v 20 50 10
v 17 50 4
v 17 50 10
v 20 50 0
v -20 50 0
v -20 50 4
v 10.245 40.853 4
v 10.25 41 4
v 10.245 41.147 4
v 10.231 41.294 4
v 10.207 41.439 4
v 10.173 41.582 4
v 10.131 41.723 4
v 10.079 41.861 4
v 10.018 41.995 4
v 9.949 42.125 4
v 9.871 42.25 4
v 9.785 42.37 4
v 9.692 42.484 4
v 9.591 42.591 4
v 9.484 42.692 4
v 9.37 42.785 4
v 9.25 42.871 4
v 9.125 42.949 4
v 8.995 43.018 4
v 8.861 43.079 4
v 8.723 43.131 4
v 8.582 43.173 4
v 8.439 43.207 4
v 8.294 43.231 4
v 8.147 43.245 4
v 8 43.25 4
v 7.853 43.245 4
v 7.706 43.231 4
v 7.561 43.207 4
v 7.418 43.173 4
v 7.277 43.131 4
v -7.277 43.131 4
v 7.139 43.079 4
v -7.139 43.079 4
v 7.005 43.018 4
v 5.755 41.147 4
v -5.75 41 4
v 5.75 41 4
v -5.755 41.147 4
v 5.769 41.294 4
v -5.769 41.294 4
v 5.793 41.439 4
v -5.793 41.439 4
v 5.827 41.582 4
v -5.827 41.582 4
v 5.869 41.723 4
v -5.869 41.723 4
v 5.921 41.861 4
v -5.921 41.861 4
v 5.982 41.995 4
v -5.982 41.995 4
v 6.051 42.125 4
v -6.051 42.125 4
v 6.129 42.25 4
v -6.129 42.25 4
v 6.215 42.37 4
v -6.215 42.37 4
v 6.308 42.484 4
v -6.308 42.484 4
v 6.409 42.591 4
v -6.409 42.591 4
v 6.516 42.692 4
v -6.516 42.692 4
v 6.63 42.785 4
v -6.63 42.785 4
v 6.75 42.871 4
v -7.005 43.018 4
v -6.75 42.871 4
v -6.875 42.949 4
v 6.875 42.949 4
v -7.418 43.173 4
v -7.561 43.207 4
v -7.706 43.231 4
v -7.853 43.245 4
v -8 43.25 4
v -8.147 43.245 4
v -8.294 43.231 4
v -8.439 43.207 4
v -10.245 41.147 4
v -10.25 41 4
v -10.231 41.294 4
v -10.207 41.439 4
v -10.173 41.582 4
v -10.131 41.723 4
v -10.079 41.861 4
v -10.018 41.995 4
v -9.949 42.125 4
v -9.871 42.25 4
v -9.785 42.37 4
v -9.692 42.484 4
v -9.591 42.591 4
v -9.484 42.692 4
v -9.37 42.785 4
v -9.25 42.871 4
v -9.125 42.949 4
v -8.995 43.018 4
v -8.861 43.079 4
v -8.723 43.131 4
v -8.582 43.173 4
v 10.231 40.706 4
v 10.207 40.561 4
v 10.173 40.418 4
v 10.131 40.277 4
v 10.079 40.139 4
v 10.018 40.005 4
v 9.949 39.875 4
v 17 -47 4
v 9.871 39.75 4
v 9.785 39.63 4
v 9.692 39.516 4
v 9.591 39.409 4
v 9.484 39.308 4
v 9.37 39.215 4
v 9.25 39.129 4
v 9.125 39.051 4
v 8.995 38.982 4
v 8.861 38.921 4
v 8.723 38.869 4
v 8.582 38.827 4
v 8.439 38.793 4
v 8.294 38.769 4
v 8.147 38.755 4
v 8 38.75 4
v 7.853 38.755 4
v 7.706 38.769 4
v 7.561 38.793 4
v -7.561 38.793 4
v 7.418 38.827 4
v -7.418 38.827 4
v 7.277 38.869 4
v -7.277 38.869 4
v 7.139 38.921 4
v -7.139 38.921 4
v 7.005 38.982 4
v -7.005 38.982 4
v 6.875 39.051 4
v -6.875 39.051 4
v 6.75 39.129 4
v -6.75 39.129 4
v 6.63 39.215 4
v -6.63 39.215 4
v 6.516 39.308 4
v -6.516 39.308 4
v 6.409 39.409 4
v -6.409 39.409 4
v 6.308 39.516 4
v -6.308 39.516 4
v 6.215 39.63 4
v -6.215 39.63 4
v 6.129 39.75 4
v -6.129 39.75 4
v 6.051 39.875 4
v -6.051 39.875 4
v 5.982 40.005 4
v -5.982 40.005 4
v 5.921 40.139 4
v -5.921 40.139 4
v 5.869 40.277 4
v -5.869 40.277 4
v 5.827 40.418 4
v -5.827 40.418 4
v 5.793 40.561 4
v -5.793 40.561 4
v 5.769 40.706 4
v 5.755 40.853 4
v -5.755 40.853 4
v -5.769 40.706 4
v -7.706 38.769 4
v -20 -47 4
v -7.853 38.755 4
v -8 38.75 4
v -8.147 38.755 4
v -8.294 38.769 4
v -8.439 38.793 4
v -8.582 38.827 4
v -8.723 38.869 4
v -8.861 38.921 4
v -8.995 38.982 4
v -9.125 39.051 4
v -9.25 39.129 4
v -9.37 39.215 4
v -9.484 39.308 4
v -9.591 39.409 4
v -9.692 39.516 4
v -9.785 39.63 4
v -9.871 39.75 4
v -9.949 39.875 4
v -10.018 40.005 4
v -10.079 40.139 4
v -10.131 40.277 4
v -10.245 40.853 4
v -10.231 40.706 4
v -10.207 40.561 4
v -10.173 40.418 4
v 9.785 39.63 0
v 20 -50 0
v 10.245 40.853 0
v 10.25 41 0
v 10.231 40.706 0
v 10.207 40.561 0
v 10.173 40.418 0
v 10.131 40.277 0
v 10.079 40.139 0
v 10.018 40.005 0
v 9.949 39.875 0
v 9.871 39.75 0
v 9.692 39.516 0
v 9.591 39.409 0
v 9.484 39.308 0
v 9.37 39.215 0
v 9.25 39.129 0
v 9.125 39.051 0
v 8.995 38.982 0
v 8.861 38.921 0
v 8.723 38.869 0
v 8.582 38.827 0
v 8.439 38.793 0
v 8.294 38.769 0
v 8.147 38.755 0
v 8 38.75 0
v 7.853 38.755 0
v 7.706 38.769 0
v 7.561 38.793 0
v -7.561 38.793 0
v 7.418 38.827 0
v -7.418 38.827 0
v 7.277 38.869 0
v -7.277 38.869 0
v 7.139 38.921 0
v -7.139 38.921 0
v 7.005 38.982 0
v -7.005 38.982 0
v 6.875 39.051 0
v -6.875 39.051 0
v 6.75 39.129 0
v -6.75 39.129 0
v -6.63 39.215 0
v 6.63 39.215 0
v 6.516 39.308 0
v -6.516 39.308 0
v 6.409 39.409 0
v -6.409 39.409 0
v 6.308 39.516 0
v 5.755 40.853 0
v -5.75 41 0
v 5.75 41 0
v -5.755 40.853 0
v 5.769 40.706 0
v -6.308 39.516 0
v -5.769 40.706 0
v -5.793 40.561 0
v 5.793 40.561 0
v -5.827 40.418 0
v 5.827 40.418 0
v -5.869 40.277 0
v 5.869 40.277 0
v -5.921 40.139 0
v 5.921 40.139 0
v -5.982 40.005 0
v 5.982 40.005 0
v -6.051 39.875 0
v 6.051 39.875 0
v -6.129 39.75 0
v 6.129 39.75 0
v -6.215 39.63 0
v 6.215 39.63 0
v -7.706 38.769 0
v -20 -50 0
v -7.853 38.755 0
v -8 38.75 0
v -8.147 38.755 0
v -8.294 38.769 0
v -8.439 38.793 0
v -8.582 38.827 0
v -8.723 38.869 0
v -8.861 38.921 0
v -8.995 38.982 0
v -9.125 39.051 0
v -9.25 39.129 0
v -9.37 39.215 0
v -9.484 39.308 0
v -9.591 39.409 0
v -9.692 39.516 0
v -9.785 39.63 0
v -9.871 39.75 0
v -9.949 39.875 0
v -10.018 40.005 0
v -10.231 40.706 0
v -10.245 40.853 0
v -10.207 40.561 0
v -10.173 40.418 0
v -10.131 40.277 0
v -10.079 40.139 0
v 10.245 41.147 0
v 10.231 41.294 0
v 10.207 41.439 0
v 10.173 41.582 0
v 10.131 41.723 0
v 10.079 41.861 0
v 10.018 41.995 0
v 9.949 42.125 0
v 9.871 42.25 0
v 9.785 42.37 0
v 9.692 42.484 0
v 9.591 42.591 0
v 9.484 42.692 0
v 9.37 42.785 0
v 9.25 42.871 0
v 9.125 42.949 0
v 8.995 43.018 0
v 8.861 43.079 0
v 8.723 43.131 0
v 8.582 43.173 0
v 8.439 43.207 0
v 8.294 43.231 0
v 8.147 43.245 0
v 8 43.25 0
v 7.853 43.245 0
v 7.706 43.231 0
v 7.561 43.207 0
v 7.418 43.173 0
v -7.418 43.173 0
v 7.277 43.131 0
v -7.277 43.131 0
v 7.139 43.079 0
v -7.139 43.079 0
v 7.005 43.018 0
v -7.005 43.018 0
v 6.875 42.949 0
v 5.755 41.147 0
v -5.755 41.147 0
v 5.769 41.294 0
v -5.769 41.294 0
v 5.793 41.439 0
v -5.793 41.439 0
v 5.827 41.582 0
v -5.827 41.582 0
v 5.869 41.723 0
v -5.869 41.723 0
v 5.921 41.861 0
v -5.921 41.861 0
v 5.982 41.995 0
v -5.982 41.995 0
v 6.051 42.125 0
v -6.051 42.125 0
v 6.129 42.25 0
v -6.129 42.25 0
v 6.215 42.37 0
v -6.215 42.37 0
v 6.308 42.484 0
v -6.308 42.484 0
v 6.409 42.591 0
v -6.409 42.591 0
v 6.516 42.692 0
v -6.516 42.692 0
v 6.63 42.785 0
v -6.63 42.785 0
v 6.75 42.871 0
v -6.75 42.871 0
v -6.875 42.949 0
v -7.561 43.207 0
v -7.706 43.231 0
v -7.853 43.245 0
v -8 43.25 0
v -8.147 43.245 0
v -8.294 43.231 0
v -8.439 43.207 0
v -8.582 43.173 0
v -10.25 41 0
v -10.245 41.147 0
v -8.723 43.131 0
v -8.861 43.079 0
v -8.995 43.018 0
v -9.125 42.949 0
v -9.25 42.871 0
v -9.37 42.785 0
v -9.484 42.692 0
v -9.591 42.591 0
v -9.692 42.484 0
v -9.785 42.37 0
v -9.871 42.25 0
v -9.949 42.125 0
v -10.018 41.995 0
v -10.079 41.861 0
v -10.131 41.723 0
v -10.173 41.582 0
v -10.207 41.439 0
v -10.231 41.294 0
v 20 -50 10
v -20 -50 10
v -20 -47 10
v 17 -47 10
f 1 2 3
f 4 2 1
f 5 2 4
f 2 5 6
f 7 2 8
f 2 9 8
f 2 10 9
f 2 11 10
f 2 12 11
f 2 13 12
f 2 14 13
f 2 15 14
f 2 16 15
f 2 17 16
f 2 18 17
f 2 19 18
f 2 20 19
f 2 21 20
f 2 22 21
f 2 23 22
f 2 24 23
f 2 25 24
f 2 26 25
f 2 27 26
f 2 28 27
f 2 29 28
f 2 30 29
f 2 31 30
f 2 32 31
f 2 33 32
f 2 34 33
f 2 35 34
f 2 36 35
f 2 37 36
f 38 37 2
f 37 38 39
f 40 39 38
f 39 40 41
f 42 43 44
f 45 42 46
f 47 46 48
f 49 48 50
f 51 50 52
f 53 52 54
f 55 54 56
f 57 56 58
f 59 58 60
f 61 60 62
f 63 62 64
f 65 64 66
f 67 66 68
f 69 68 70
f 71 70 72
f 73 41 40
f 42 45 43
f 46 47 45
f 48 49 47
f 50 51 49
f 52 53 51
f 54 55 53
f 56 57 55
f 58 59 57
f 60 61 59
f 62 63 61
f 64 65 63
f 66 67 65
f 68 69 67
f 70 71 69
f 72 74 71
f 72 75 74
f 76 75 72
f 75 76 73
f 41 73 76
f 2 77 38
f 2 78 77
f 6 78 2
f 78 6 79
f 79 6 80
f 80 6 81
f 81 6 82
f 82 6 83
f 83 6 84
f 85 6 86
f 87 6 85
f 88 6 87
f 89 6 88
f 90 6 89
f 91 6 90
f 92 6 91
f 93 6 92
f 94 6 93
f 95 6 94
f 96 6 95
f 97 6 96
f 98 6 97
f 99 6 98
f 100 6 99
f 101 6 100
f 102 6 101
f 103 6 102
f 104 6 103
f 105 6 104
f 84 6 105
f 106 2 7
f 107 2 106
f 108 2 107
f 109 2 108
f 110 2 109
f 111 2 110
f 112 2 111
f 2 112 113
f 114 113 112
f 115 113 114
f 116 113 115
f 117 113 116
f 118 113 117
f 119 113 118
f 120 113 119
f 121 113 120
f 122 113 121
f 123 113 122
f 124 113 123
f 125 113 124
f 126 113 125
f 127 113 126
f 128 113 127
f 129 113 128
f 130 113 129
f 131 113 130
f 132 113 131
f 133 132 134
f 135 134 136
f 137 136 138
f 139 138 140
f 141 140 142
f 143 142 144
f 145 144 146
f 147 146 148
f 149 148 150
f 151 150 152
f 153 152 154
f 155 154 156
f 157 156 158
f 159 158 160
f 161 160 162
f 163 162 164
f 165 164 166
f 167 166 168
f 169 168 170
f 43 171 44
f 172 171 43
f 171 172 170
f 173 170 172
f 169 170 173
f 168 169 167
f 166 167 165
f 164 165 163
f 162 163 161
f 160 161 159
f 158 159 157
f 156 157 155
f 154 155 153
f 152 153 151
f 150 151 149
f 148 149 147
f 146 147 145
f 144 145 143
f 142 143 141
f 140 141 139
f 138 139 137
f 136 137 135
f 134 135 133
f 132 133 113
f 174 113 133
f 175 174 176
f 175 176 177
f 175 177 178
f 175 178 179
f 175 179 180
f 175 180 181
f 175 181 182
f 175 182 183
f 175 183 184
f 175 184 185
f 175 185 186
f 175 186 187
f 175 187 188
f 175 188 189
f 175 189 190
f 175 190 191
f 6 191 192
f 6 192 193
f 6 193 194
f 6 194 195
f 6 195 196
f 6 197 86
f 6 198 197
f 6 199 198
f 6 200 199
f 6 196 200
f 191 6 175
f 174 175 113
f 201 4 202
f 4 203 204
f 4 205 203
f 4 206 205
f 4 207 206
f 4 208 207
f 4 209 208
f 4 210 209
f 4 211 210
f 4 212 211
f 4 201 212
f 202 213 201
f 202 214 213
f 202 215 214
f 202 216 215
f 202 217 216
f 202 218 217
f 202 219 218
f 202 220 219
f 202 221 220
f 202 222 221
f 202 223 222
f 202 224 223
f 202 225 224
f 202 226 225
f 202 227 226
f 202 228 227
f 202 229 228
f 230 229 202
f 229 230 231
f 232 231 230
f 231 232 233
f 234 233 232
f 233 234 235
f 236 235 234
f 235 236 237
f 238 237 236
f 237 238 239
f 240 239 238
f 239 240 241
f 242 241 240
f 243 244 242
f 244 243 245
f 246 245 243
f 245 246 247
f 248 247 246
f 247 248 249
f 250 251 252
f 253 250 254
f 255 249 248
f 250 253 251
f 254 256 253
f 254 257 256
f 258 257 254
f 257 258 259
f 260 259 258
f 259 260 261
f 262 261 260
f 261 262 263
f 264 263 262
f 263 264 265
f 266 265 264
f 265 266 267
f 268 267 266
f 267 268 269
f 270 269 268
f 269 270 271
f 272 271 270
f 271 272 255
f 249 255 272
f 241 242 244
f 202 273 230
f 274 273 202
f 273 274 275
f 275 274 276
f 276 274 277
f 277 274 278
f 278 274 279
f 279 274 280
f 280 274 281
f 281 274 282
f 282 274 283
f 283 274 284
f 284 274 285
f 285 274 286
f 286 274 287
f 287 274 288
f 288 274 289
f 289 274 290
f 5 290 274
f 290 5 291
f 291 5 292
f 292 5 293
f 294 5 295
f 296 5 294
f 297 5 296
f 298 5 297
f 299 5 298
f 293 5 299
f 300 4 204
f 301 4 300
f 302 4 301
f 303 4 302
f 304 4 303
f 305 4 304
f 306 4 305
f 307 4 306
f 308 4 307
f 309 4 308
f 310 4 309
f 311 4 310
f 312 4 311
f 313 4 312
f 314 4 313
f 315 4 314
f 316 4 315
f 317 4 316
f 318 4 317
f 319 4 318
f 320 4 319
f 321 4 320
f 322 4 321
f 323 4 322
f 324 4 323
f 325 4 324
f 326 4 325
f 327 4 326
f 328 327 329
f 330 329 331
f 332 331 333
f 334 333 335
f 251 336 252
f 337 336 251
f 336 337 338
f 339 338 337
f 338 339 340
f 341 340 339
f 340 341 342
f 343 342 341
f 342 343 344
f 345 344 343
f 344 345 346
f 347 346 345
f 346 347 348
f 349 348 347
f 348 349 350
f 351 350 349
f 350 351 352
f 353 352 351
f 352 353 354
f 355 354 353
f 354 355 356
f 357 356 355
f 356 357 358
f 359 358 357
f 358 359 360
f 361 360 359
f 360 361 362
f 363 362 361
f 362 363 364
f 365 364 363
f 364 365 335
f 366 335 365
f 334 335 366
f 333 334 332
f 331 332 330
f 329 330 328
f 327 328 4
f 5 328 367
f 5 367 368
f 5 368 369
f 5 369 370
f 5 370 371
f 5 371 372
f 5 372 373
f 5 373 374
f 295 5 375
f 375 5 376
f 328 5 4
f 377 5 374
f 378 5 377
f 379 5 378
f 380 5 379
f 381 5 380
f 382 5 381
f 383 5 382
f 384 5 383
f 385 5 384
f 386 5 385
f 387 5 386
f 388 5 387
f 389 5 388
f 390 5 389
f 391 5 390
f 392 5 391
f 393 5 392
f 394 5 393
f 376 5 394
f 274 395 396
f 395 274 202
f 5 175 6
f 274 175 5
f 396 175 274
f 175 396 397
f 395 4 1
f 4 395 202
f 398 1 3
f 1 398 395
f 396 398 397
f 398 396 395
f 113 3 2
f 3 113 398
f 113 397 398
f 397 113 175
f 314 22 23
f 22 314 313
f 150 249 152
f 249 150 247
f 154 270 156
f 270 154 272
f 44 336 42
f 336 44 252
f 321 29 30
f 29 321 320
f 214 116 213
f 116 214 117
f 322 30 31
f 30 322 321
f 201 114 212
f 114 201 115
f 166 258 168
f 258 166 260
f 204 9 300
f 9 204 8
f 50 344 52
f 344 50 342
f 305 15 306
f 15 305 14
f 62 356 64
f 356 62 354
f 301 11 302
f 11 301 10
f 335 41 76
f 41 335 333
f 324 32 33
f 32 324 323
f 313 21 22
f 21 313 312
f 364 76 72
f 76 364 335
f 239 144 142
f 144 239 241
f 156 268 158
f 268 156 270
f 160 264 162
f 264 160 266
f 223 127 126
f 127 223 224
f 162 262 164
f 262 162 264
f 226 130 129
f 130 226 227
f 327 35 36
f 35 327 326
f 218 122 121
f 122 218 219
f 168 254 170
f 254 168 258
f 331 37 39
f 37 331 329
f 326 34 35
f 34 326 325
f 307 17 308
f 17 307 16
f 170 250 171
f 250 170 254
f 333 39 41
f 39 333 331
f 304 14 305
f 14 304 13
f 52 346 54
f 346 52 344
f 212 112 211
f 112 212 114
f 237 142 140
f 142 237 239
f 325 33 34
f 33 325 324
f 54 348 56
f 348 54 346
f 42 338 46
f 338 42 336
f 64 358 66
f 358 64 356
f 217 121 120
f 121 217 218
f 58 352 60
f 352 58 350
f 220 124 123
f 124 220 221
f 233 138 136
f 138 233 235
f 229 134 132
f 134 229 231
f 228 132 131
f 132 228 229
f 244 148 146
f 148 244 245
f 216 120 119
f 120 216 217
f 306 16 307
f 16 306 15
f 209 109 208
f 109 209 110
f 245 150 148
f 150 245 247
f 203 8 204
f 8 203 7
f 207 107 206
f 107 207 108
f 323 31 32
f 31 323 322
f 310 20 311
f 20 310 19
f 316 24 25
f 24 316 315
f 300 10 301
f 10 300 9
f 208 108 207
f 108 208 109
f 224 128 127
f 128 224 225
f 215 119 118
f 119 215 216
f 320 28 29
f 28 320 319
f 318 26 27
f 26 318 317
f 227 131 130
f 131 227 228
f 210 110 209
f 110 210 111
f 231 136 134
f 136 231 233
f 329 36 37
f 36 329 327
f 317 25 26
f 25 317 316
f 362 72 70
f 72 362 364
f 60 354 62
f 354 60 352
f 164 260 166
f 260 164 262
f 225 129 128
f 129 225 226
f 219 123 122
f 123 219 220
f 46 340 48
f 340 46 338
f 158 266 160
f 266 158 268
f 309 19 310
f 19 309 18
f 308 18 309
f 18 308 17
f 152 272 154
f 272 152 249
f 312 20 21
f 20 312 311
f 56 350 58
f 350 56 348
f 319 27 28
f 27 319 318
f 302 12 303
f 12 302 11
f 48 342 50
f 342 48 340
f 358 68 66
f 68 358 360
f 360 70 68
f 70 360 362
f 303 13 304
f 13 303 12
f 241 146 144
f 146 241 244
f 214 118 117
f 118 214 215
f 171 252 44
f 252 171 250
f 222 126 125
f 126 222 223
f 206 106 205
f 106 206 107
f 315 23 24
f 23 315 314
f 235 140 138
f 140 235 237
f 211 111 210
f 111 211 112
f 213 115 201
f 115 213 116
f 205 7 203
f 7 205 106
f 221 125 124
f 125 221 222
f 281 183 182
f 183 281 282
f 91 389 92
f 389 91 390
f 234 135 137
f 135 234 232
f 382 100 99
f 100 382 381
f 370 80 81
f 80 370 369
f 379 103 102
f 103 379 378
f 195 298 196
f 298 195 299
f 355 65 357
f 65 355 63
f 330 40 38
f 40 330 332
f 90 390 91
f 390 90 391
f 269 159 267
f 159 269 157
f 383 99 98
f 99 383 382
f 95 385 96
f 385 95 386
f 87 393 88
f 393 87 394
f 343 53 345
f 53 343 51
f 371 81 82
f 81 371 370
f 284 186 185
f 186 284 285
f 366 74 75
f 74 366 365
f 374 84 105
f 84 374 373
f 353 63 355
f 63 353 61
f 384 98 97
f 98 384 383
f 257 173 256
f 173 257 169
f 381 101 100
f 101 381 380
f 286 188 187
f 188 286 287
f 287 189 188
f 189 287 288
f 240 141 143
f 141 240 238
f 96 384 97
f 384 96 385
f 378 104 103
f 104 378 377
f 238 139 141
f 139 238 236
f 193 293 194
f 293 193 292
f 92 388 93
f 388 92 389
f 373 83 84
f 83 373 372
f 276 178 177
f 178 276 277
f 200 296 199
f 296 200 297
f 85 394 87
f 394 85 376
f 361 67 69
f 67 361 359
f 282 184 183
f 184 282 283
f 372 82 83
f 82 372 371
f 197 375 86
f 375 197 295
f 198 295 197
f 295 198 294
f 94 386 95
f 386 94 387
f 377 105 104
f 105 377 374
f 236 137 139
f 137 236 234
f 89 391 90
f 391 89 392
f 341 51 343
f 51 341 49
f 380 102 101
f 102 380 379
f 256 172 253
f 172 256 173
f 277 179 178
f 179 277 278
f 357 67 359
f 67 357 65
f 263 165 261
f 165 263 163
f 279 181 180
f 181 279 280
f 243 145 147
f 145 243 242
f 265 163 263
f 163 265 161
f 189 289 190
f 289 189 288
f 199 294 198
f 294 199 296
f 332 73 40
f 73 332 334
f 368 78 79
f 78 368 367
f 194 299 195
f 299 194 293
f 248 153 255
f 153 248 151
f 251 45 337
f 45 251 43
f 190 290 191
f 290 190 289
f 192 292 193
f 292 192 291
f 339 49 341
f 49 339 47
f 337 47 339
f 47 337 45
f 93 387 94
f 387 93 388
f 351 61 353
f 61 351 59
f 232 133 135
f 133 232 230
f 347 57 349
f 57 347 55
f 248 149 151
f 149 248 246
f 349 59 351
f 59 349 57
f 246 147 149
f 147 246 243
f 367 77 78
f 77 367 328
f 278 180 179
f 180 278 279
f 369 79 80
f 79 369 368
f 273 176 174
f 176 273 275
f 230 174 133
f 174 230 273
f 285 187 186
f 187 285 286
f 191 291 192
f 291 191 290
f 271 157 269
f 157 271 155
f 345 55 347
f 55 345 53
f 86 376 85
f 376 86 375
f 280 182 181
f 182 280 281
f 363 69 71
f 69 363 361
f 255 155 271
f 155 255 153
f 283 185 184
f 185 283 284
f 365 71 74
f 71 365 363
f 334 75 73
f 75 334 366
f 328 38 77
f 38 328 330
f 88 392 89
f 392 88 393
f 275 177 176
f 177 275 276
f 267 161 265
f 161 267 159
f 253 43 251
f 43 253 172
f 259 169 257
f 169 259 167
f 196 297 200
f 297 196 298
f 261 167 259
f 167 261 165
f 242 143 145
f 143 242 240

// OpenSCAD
rotate([0,0,90]) {
// Microscope-slide registration jig with two clamp holes
// Category: benchware; Purpose: repeatable origin when photographing a 75 x 25 mm microscope slide.
// Print: FDM, on the broad bottom face at z=0; no support required.
// This is a geometric reference design; no dimensional fit or lab use has been physically validated.
// SPDX-License-Identifier: CERN-OHL-P-2.0

/* [Platform] */
// Overall platform length, X (mm)
base_l = 100; // 0.5
// Overall platform width, Y (mm)
base_w = 40; // 0.5
// Platform thickness (mm)
base_h = 4; // 0.5

/* [Registration Edges] */
// Width of each perpendicular registration rail (mm)
rail_w = 3; // 0.1
// Height of rails above print bed (mm)
rail_top = 10; // 0.5

/* [Fasteners] */
// Diameter of each right-side mounting hole (mm)
bore_d = 4.5; // 0.1
// X coordinate of the mounting-hole centers (mm)
bore_x = 41; // 0.5
// Absolute Y coordinate of mounting-hole centers (mm)
bore_y = 8; // 0.5

/* [Hidden] */
$fn = 96;
eps = 0.1;
assert(base_l >= 90 && base_w >= 35);
assert(rail_w >= 1.6 && rail_top >= base_h + 2);
assert(bore_d > 0 && bore_d < 8);
assert(bore_x + bore_d/2 < base_l/2 - 1);
assert(bore_x - bore_d/2 > -base_l/2 + rail_w + 1);
assert(bore_y + bore_d/2 < base_w/2 - 1);
assert(bore_y - bore_d/2 > -base_w/2 + rail_w + 1);
assert(bore_d / 2 + 2 < bore_y);

difference() {
    union() {
        translate([-base_l/2, -base_w/2, 0])
            cube([base_l, base_w, base_h]);
        translate([-base_l/2, -base_w/2, base_h])
            cube([base_l, rail_w, rail_top-base_h]);
        translate([-base_l/2, -base_w/2, base_h])
            cube([rail_w, base_w, rail_top-base_h]);
    }
    for (sign=[-1,1])
        translate([bore_x, sign*bore_y, -eps])
            cylinder(h=base_h+2*eps, d=bore_d);
}

}
